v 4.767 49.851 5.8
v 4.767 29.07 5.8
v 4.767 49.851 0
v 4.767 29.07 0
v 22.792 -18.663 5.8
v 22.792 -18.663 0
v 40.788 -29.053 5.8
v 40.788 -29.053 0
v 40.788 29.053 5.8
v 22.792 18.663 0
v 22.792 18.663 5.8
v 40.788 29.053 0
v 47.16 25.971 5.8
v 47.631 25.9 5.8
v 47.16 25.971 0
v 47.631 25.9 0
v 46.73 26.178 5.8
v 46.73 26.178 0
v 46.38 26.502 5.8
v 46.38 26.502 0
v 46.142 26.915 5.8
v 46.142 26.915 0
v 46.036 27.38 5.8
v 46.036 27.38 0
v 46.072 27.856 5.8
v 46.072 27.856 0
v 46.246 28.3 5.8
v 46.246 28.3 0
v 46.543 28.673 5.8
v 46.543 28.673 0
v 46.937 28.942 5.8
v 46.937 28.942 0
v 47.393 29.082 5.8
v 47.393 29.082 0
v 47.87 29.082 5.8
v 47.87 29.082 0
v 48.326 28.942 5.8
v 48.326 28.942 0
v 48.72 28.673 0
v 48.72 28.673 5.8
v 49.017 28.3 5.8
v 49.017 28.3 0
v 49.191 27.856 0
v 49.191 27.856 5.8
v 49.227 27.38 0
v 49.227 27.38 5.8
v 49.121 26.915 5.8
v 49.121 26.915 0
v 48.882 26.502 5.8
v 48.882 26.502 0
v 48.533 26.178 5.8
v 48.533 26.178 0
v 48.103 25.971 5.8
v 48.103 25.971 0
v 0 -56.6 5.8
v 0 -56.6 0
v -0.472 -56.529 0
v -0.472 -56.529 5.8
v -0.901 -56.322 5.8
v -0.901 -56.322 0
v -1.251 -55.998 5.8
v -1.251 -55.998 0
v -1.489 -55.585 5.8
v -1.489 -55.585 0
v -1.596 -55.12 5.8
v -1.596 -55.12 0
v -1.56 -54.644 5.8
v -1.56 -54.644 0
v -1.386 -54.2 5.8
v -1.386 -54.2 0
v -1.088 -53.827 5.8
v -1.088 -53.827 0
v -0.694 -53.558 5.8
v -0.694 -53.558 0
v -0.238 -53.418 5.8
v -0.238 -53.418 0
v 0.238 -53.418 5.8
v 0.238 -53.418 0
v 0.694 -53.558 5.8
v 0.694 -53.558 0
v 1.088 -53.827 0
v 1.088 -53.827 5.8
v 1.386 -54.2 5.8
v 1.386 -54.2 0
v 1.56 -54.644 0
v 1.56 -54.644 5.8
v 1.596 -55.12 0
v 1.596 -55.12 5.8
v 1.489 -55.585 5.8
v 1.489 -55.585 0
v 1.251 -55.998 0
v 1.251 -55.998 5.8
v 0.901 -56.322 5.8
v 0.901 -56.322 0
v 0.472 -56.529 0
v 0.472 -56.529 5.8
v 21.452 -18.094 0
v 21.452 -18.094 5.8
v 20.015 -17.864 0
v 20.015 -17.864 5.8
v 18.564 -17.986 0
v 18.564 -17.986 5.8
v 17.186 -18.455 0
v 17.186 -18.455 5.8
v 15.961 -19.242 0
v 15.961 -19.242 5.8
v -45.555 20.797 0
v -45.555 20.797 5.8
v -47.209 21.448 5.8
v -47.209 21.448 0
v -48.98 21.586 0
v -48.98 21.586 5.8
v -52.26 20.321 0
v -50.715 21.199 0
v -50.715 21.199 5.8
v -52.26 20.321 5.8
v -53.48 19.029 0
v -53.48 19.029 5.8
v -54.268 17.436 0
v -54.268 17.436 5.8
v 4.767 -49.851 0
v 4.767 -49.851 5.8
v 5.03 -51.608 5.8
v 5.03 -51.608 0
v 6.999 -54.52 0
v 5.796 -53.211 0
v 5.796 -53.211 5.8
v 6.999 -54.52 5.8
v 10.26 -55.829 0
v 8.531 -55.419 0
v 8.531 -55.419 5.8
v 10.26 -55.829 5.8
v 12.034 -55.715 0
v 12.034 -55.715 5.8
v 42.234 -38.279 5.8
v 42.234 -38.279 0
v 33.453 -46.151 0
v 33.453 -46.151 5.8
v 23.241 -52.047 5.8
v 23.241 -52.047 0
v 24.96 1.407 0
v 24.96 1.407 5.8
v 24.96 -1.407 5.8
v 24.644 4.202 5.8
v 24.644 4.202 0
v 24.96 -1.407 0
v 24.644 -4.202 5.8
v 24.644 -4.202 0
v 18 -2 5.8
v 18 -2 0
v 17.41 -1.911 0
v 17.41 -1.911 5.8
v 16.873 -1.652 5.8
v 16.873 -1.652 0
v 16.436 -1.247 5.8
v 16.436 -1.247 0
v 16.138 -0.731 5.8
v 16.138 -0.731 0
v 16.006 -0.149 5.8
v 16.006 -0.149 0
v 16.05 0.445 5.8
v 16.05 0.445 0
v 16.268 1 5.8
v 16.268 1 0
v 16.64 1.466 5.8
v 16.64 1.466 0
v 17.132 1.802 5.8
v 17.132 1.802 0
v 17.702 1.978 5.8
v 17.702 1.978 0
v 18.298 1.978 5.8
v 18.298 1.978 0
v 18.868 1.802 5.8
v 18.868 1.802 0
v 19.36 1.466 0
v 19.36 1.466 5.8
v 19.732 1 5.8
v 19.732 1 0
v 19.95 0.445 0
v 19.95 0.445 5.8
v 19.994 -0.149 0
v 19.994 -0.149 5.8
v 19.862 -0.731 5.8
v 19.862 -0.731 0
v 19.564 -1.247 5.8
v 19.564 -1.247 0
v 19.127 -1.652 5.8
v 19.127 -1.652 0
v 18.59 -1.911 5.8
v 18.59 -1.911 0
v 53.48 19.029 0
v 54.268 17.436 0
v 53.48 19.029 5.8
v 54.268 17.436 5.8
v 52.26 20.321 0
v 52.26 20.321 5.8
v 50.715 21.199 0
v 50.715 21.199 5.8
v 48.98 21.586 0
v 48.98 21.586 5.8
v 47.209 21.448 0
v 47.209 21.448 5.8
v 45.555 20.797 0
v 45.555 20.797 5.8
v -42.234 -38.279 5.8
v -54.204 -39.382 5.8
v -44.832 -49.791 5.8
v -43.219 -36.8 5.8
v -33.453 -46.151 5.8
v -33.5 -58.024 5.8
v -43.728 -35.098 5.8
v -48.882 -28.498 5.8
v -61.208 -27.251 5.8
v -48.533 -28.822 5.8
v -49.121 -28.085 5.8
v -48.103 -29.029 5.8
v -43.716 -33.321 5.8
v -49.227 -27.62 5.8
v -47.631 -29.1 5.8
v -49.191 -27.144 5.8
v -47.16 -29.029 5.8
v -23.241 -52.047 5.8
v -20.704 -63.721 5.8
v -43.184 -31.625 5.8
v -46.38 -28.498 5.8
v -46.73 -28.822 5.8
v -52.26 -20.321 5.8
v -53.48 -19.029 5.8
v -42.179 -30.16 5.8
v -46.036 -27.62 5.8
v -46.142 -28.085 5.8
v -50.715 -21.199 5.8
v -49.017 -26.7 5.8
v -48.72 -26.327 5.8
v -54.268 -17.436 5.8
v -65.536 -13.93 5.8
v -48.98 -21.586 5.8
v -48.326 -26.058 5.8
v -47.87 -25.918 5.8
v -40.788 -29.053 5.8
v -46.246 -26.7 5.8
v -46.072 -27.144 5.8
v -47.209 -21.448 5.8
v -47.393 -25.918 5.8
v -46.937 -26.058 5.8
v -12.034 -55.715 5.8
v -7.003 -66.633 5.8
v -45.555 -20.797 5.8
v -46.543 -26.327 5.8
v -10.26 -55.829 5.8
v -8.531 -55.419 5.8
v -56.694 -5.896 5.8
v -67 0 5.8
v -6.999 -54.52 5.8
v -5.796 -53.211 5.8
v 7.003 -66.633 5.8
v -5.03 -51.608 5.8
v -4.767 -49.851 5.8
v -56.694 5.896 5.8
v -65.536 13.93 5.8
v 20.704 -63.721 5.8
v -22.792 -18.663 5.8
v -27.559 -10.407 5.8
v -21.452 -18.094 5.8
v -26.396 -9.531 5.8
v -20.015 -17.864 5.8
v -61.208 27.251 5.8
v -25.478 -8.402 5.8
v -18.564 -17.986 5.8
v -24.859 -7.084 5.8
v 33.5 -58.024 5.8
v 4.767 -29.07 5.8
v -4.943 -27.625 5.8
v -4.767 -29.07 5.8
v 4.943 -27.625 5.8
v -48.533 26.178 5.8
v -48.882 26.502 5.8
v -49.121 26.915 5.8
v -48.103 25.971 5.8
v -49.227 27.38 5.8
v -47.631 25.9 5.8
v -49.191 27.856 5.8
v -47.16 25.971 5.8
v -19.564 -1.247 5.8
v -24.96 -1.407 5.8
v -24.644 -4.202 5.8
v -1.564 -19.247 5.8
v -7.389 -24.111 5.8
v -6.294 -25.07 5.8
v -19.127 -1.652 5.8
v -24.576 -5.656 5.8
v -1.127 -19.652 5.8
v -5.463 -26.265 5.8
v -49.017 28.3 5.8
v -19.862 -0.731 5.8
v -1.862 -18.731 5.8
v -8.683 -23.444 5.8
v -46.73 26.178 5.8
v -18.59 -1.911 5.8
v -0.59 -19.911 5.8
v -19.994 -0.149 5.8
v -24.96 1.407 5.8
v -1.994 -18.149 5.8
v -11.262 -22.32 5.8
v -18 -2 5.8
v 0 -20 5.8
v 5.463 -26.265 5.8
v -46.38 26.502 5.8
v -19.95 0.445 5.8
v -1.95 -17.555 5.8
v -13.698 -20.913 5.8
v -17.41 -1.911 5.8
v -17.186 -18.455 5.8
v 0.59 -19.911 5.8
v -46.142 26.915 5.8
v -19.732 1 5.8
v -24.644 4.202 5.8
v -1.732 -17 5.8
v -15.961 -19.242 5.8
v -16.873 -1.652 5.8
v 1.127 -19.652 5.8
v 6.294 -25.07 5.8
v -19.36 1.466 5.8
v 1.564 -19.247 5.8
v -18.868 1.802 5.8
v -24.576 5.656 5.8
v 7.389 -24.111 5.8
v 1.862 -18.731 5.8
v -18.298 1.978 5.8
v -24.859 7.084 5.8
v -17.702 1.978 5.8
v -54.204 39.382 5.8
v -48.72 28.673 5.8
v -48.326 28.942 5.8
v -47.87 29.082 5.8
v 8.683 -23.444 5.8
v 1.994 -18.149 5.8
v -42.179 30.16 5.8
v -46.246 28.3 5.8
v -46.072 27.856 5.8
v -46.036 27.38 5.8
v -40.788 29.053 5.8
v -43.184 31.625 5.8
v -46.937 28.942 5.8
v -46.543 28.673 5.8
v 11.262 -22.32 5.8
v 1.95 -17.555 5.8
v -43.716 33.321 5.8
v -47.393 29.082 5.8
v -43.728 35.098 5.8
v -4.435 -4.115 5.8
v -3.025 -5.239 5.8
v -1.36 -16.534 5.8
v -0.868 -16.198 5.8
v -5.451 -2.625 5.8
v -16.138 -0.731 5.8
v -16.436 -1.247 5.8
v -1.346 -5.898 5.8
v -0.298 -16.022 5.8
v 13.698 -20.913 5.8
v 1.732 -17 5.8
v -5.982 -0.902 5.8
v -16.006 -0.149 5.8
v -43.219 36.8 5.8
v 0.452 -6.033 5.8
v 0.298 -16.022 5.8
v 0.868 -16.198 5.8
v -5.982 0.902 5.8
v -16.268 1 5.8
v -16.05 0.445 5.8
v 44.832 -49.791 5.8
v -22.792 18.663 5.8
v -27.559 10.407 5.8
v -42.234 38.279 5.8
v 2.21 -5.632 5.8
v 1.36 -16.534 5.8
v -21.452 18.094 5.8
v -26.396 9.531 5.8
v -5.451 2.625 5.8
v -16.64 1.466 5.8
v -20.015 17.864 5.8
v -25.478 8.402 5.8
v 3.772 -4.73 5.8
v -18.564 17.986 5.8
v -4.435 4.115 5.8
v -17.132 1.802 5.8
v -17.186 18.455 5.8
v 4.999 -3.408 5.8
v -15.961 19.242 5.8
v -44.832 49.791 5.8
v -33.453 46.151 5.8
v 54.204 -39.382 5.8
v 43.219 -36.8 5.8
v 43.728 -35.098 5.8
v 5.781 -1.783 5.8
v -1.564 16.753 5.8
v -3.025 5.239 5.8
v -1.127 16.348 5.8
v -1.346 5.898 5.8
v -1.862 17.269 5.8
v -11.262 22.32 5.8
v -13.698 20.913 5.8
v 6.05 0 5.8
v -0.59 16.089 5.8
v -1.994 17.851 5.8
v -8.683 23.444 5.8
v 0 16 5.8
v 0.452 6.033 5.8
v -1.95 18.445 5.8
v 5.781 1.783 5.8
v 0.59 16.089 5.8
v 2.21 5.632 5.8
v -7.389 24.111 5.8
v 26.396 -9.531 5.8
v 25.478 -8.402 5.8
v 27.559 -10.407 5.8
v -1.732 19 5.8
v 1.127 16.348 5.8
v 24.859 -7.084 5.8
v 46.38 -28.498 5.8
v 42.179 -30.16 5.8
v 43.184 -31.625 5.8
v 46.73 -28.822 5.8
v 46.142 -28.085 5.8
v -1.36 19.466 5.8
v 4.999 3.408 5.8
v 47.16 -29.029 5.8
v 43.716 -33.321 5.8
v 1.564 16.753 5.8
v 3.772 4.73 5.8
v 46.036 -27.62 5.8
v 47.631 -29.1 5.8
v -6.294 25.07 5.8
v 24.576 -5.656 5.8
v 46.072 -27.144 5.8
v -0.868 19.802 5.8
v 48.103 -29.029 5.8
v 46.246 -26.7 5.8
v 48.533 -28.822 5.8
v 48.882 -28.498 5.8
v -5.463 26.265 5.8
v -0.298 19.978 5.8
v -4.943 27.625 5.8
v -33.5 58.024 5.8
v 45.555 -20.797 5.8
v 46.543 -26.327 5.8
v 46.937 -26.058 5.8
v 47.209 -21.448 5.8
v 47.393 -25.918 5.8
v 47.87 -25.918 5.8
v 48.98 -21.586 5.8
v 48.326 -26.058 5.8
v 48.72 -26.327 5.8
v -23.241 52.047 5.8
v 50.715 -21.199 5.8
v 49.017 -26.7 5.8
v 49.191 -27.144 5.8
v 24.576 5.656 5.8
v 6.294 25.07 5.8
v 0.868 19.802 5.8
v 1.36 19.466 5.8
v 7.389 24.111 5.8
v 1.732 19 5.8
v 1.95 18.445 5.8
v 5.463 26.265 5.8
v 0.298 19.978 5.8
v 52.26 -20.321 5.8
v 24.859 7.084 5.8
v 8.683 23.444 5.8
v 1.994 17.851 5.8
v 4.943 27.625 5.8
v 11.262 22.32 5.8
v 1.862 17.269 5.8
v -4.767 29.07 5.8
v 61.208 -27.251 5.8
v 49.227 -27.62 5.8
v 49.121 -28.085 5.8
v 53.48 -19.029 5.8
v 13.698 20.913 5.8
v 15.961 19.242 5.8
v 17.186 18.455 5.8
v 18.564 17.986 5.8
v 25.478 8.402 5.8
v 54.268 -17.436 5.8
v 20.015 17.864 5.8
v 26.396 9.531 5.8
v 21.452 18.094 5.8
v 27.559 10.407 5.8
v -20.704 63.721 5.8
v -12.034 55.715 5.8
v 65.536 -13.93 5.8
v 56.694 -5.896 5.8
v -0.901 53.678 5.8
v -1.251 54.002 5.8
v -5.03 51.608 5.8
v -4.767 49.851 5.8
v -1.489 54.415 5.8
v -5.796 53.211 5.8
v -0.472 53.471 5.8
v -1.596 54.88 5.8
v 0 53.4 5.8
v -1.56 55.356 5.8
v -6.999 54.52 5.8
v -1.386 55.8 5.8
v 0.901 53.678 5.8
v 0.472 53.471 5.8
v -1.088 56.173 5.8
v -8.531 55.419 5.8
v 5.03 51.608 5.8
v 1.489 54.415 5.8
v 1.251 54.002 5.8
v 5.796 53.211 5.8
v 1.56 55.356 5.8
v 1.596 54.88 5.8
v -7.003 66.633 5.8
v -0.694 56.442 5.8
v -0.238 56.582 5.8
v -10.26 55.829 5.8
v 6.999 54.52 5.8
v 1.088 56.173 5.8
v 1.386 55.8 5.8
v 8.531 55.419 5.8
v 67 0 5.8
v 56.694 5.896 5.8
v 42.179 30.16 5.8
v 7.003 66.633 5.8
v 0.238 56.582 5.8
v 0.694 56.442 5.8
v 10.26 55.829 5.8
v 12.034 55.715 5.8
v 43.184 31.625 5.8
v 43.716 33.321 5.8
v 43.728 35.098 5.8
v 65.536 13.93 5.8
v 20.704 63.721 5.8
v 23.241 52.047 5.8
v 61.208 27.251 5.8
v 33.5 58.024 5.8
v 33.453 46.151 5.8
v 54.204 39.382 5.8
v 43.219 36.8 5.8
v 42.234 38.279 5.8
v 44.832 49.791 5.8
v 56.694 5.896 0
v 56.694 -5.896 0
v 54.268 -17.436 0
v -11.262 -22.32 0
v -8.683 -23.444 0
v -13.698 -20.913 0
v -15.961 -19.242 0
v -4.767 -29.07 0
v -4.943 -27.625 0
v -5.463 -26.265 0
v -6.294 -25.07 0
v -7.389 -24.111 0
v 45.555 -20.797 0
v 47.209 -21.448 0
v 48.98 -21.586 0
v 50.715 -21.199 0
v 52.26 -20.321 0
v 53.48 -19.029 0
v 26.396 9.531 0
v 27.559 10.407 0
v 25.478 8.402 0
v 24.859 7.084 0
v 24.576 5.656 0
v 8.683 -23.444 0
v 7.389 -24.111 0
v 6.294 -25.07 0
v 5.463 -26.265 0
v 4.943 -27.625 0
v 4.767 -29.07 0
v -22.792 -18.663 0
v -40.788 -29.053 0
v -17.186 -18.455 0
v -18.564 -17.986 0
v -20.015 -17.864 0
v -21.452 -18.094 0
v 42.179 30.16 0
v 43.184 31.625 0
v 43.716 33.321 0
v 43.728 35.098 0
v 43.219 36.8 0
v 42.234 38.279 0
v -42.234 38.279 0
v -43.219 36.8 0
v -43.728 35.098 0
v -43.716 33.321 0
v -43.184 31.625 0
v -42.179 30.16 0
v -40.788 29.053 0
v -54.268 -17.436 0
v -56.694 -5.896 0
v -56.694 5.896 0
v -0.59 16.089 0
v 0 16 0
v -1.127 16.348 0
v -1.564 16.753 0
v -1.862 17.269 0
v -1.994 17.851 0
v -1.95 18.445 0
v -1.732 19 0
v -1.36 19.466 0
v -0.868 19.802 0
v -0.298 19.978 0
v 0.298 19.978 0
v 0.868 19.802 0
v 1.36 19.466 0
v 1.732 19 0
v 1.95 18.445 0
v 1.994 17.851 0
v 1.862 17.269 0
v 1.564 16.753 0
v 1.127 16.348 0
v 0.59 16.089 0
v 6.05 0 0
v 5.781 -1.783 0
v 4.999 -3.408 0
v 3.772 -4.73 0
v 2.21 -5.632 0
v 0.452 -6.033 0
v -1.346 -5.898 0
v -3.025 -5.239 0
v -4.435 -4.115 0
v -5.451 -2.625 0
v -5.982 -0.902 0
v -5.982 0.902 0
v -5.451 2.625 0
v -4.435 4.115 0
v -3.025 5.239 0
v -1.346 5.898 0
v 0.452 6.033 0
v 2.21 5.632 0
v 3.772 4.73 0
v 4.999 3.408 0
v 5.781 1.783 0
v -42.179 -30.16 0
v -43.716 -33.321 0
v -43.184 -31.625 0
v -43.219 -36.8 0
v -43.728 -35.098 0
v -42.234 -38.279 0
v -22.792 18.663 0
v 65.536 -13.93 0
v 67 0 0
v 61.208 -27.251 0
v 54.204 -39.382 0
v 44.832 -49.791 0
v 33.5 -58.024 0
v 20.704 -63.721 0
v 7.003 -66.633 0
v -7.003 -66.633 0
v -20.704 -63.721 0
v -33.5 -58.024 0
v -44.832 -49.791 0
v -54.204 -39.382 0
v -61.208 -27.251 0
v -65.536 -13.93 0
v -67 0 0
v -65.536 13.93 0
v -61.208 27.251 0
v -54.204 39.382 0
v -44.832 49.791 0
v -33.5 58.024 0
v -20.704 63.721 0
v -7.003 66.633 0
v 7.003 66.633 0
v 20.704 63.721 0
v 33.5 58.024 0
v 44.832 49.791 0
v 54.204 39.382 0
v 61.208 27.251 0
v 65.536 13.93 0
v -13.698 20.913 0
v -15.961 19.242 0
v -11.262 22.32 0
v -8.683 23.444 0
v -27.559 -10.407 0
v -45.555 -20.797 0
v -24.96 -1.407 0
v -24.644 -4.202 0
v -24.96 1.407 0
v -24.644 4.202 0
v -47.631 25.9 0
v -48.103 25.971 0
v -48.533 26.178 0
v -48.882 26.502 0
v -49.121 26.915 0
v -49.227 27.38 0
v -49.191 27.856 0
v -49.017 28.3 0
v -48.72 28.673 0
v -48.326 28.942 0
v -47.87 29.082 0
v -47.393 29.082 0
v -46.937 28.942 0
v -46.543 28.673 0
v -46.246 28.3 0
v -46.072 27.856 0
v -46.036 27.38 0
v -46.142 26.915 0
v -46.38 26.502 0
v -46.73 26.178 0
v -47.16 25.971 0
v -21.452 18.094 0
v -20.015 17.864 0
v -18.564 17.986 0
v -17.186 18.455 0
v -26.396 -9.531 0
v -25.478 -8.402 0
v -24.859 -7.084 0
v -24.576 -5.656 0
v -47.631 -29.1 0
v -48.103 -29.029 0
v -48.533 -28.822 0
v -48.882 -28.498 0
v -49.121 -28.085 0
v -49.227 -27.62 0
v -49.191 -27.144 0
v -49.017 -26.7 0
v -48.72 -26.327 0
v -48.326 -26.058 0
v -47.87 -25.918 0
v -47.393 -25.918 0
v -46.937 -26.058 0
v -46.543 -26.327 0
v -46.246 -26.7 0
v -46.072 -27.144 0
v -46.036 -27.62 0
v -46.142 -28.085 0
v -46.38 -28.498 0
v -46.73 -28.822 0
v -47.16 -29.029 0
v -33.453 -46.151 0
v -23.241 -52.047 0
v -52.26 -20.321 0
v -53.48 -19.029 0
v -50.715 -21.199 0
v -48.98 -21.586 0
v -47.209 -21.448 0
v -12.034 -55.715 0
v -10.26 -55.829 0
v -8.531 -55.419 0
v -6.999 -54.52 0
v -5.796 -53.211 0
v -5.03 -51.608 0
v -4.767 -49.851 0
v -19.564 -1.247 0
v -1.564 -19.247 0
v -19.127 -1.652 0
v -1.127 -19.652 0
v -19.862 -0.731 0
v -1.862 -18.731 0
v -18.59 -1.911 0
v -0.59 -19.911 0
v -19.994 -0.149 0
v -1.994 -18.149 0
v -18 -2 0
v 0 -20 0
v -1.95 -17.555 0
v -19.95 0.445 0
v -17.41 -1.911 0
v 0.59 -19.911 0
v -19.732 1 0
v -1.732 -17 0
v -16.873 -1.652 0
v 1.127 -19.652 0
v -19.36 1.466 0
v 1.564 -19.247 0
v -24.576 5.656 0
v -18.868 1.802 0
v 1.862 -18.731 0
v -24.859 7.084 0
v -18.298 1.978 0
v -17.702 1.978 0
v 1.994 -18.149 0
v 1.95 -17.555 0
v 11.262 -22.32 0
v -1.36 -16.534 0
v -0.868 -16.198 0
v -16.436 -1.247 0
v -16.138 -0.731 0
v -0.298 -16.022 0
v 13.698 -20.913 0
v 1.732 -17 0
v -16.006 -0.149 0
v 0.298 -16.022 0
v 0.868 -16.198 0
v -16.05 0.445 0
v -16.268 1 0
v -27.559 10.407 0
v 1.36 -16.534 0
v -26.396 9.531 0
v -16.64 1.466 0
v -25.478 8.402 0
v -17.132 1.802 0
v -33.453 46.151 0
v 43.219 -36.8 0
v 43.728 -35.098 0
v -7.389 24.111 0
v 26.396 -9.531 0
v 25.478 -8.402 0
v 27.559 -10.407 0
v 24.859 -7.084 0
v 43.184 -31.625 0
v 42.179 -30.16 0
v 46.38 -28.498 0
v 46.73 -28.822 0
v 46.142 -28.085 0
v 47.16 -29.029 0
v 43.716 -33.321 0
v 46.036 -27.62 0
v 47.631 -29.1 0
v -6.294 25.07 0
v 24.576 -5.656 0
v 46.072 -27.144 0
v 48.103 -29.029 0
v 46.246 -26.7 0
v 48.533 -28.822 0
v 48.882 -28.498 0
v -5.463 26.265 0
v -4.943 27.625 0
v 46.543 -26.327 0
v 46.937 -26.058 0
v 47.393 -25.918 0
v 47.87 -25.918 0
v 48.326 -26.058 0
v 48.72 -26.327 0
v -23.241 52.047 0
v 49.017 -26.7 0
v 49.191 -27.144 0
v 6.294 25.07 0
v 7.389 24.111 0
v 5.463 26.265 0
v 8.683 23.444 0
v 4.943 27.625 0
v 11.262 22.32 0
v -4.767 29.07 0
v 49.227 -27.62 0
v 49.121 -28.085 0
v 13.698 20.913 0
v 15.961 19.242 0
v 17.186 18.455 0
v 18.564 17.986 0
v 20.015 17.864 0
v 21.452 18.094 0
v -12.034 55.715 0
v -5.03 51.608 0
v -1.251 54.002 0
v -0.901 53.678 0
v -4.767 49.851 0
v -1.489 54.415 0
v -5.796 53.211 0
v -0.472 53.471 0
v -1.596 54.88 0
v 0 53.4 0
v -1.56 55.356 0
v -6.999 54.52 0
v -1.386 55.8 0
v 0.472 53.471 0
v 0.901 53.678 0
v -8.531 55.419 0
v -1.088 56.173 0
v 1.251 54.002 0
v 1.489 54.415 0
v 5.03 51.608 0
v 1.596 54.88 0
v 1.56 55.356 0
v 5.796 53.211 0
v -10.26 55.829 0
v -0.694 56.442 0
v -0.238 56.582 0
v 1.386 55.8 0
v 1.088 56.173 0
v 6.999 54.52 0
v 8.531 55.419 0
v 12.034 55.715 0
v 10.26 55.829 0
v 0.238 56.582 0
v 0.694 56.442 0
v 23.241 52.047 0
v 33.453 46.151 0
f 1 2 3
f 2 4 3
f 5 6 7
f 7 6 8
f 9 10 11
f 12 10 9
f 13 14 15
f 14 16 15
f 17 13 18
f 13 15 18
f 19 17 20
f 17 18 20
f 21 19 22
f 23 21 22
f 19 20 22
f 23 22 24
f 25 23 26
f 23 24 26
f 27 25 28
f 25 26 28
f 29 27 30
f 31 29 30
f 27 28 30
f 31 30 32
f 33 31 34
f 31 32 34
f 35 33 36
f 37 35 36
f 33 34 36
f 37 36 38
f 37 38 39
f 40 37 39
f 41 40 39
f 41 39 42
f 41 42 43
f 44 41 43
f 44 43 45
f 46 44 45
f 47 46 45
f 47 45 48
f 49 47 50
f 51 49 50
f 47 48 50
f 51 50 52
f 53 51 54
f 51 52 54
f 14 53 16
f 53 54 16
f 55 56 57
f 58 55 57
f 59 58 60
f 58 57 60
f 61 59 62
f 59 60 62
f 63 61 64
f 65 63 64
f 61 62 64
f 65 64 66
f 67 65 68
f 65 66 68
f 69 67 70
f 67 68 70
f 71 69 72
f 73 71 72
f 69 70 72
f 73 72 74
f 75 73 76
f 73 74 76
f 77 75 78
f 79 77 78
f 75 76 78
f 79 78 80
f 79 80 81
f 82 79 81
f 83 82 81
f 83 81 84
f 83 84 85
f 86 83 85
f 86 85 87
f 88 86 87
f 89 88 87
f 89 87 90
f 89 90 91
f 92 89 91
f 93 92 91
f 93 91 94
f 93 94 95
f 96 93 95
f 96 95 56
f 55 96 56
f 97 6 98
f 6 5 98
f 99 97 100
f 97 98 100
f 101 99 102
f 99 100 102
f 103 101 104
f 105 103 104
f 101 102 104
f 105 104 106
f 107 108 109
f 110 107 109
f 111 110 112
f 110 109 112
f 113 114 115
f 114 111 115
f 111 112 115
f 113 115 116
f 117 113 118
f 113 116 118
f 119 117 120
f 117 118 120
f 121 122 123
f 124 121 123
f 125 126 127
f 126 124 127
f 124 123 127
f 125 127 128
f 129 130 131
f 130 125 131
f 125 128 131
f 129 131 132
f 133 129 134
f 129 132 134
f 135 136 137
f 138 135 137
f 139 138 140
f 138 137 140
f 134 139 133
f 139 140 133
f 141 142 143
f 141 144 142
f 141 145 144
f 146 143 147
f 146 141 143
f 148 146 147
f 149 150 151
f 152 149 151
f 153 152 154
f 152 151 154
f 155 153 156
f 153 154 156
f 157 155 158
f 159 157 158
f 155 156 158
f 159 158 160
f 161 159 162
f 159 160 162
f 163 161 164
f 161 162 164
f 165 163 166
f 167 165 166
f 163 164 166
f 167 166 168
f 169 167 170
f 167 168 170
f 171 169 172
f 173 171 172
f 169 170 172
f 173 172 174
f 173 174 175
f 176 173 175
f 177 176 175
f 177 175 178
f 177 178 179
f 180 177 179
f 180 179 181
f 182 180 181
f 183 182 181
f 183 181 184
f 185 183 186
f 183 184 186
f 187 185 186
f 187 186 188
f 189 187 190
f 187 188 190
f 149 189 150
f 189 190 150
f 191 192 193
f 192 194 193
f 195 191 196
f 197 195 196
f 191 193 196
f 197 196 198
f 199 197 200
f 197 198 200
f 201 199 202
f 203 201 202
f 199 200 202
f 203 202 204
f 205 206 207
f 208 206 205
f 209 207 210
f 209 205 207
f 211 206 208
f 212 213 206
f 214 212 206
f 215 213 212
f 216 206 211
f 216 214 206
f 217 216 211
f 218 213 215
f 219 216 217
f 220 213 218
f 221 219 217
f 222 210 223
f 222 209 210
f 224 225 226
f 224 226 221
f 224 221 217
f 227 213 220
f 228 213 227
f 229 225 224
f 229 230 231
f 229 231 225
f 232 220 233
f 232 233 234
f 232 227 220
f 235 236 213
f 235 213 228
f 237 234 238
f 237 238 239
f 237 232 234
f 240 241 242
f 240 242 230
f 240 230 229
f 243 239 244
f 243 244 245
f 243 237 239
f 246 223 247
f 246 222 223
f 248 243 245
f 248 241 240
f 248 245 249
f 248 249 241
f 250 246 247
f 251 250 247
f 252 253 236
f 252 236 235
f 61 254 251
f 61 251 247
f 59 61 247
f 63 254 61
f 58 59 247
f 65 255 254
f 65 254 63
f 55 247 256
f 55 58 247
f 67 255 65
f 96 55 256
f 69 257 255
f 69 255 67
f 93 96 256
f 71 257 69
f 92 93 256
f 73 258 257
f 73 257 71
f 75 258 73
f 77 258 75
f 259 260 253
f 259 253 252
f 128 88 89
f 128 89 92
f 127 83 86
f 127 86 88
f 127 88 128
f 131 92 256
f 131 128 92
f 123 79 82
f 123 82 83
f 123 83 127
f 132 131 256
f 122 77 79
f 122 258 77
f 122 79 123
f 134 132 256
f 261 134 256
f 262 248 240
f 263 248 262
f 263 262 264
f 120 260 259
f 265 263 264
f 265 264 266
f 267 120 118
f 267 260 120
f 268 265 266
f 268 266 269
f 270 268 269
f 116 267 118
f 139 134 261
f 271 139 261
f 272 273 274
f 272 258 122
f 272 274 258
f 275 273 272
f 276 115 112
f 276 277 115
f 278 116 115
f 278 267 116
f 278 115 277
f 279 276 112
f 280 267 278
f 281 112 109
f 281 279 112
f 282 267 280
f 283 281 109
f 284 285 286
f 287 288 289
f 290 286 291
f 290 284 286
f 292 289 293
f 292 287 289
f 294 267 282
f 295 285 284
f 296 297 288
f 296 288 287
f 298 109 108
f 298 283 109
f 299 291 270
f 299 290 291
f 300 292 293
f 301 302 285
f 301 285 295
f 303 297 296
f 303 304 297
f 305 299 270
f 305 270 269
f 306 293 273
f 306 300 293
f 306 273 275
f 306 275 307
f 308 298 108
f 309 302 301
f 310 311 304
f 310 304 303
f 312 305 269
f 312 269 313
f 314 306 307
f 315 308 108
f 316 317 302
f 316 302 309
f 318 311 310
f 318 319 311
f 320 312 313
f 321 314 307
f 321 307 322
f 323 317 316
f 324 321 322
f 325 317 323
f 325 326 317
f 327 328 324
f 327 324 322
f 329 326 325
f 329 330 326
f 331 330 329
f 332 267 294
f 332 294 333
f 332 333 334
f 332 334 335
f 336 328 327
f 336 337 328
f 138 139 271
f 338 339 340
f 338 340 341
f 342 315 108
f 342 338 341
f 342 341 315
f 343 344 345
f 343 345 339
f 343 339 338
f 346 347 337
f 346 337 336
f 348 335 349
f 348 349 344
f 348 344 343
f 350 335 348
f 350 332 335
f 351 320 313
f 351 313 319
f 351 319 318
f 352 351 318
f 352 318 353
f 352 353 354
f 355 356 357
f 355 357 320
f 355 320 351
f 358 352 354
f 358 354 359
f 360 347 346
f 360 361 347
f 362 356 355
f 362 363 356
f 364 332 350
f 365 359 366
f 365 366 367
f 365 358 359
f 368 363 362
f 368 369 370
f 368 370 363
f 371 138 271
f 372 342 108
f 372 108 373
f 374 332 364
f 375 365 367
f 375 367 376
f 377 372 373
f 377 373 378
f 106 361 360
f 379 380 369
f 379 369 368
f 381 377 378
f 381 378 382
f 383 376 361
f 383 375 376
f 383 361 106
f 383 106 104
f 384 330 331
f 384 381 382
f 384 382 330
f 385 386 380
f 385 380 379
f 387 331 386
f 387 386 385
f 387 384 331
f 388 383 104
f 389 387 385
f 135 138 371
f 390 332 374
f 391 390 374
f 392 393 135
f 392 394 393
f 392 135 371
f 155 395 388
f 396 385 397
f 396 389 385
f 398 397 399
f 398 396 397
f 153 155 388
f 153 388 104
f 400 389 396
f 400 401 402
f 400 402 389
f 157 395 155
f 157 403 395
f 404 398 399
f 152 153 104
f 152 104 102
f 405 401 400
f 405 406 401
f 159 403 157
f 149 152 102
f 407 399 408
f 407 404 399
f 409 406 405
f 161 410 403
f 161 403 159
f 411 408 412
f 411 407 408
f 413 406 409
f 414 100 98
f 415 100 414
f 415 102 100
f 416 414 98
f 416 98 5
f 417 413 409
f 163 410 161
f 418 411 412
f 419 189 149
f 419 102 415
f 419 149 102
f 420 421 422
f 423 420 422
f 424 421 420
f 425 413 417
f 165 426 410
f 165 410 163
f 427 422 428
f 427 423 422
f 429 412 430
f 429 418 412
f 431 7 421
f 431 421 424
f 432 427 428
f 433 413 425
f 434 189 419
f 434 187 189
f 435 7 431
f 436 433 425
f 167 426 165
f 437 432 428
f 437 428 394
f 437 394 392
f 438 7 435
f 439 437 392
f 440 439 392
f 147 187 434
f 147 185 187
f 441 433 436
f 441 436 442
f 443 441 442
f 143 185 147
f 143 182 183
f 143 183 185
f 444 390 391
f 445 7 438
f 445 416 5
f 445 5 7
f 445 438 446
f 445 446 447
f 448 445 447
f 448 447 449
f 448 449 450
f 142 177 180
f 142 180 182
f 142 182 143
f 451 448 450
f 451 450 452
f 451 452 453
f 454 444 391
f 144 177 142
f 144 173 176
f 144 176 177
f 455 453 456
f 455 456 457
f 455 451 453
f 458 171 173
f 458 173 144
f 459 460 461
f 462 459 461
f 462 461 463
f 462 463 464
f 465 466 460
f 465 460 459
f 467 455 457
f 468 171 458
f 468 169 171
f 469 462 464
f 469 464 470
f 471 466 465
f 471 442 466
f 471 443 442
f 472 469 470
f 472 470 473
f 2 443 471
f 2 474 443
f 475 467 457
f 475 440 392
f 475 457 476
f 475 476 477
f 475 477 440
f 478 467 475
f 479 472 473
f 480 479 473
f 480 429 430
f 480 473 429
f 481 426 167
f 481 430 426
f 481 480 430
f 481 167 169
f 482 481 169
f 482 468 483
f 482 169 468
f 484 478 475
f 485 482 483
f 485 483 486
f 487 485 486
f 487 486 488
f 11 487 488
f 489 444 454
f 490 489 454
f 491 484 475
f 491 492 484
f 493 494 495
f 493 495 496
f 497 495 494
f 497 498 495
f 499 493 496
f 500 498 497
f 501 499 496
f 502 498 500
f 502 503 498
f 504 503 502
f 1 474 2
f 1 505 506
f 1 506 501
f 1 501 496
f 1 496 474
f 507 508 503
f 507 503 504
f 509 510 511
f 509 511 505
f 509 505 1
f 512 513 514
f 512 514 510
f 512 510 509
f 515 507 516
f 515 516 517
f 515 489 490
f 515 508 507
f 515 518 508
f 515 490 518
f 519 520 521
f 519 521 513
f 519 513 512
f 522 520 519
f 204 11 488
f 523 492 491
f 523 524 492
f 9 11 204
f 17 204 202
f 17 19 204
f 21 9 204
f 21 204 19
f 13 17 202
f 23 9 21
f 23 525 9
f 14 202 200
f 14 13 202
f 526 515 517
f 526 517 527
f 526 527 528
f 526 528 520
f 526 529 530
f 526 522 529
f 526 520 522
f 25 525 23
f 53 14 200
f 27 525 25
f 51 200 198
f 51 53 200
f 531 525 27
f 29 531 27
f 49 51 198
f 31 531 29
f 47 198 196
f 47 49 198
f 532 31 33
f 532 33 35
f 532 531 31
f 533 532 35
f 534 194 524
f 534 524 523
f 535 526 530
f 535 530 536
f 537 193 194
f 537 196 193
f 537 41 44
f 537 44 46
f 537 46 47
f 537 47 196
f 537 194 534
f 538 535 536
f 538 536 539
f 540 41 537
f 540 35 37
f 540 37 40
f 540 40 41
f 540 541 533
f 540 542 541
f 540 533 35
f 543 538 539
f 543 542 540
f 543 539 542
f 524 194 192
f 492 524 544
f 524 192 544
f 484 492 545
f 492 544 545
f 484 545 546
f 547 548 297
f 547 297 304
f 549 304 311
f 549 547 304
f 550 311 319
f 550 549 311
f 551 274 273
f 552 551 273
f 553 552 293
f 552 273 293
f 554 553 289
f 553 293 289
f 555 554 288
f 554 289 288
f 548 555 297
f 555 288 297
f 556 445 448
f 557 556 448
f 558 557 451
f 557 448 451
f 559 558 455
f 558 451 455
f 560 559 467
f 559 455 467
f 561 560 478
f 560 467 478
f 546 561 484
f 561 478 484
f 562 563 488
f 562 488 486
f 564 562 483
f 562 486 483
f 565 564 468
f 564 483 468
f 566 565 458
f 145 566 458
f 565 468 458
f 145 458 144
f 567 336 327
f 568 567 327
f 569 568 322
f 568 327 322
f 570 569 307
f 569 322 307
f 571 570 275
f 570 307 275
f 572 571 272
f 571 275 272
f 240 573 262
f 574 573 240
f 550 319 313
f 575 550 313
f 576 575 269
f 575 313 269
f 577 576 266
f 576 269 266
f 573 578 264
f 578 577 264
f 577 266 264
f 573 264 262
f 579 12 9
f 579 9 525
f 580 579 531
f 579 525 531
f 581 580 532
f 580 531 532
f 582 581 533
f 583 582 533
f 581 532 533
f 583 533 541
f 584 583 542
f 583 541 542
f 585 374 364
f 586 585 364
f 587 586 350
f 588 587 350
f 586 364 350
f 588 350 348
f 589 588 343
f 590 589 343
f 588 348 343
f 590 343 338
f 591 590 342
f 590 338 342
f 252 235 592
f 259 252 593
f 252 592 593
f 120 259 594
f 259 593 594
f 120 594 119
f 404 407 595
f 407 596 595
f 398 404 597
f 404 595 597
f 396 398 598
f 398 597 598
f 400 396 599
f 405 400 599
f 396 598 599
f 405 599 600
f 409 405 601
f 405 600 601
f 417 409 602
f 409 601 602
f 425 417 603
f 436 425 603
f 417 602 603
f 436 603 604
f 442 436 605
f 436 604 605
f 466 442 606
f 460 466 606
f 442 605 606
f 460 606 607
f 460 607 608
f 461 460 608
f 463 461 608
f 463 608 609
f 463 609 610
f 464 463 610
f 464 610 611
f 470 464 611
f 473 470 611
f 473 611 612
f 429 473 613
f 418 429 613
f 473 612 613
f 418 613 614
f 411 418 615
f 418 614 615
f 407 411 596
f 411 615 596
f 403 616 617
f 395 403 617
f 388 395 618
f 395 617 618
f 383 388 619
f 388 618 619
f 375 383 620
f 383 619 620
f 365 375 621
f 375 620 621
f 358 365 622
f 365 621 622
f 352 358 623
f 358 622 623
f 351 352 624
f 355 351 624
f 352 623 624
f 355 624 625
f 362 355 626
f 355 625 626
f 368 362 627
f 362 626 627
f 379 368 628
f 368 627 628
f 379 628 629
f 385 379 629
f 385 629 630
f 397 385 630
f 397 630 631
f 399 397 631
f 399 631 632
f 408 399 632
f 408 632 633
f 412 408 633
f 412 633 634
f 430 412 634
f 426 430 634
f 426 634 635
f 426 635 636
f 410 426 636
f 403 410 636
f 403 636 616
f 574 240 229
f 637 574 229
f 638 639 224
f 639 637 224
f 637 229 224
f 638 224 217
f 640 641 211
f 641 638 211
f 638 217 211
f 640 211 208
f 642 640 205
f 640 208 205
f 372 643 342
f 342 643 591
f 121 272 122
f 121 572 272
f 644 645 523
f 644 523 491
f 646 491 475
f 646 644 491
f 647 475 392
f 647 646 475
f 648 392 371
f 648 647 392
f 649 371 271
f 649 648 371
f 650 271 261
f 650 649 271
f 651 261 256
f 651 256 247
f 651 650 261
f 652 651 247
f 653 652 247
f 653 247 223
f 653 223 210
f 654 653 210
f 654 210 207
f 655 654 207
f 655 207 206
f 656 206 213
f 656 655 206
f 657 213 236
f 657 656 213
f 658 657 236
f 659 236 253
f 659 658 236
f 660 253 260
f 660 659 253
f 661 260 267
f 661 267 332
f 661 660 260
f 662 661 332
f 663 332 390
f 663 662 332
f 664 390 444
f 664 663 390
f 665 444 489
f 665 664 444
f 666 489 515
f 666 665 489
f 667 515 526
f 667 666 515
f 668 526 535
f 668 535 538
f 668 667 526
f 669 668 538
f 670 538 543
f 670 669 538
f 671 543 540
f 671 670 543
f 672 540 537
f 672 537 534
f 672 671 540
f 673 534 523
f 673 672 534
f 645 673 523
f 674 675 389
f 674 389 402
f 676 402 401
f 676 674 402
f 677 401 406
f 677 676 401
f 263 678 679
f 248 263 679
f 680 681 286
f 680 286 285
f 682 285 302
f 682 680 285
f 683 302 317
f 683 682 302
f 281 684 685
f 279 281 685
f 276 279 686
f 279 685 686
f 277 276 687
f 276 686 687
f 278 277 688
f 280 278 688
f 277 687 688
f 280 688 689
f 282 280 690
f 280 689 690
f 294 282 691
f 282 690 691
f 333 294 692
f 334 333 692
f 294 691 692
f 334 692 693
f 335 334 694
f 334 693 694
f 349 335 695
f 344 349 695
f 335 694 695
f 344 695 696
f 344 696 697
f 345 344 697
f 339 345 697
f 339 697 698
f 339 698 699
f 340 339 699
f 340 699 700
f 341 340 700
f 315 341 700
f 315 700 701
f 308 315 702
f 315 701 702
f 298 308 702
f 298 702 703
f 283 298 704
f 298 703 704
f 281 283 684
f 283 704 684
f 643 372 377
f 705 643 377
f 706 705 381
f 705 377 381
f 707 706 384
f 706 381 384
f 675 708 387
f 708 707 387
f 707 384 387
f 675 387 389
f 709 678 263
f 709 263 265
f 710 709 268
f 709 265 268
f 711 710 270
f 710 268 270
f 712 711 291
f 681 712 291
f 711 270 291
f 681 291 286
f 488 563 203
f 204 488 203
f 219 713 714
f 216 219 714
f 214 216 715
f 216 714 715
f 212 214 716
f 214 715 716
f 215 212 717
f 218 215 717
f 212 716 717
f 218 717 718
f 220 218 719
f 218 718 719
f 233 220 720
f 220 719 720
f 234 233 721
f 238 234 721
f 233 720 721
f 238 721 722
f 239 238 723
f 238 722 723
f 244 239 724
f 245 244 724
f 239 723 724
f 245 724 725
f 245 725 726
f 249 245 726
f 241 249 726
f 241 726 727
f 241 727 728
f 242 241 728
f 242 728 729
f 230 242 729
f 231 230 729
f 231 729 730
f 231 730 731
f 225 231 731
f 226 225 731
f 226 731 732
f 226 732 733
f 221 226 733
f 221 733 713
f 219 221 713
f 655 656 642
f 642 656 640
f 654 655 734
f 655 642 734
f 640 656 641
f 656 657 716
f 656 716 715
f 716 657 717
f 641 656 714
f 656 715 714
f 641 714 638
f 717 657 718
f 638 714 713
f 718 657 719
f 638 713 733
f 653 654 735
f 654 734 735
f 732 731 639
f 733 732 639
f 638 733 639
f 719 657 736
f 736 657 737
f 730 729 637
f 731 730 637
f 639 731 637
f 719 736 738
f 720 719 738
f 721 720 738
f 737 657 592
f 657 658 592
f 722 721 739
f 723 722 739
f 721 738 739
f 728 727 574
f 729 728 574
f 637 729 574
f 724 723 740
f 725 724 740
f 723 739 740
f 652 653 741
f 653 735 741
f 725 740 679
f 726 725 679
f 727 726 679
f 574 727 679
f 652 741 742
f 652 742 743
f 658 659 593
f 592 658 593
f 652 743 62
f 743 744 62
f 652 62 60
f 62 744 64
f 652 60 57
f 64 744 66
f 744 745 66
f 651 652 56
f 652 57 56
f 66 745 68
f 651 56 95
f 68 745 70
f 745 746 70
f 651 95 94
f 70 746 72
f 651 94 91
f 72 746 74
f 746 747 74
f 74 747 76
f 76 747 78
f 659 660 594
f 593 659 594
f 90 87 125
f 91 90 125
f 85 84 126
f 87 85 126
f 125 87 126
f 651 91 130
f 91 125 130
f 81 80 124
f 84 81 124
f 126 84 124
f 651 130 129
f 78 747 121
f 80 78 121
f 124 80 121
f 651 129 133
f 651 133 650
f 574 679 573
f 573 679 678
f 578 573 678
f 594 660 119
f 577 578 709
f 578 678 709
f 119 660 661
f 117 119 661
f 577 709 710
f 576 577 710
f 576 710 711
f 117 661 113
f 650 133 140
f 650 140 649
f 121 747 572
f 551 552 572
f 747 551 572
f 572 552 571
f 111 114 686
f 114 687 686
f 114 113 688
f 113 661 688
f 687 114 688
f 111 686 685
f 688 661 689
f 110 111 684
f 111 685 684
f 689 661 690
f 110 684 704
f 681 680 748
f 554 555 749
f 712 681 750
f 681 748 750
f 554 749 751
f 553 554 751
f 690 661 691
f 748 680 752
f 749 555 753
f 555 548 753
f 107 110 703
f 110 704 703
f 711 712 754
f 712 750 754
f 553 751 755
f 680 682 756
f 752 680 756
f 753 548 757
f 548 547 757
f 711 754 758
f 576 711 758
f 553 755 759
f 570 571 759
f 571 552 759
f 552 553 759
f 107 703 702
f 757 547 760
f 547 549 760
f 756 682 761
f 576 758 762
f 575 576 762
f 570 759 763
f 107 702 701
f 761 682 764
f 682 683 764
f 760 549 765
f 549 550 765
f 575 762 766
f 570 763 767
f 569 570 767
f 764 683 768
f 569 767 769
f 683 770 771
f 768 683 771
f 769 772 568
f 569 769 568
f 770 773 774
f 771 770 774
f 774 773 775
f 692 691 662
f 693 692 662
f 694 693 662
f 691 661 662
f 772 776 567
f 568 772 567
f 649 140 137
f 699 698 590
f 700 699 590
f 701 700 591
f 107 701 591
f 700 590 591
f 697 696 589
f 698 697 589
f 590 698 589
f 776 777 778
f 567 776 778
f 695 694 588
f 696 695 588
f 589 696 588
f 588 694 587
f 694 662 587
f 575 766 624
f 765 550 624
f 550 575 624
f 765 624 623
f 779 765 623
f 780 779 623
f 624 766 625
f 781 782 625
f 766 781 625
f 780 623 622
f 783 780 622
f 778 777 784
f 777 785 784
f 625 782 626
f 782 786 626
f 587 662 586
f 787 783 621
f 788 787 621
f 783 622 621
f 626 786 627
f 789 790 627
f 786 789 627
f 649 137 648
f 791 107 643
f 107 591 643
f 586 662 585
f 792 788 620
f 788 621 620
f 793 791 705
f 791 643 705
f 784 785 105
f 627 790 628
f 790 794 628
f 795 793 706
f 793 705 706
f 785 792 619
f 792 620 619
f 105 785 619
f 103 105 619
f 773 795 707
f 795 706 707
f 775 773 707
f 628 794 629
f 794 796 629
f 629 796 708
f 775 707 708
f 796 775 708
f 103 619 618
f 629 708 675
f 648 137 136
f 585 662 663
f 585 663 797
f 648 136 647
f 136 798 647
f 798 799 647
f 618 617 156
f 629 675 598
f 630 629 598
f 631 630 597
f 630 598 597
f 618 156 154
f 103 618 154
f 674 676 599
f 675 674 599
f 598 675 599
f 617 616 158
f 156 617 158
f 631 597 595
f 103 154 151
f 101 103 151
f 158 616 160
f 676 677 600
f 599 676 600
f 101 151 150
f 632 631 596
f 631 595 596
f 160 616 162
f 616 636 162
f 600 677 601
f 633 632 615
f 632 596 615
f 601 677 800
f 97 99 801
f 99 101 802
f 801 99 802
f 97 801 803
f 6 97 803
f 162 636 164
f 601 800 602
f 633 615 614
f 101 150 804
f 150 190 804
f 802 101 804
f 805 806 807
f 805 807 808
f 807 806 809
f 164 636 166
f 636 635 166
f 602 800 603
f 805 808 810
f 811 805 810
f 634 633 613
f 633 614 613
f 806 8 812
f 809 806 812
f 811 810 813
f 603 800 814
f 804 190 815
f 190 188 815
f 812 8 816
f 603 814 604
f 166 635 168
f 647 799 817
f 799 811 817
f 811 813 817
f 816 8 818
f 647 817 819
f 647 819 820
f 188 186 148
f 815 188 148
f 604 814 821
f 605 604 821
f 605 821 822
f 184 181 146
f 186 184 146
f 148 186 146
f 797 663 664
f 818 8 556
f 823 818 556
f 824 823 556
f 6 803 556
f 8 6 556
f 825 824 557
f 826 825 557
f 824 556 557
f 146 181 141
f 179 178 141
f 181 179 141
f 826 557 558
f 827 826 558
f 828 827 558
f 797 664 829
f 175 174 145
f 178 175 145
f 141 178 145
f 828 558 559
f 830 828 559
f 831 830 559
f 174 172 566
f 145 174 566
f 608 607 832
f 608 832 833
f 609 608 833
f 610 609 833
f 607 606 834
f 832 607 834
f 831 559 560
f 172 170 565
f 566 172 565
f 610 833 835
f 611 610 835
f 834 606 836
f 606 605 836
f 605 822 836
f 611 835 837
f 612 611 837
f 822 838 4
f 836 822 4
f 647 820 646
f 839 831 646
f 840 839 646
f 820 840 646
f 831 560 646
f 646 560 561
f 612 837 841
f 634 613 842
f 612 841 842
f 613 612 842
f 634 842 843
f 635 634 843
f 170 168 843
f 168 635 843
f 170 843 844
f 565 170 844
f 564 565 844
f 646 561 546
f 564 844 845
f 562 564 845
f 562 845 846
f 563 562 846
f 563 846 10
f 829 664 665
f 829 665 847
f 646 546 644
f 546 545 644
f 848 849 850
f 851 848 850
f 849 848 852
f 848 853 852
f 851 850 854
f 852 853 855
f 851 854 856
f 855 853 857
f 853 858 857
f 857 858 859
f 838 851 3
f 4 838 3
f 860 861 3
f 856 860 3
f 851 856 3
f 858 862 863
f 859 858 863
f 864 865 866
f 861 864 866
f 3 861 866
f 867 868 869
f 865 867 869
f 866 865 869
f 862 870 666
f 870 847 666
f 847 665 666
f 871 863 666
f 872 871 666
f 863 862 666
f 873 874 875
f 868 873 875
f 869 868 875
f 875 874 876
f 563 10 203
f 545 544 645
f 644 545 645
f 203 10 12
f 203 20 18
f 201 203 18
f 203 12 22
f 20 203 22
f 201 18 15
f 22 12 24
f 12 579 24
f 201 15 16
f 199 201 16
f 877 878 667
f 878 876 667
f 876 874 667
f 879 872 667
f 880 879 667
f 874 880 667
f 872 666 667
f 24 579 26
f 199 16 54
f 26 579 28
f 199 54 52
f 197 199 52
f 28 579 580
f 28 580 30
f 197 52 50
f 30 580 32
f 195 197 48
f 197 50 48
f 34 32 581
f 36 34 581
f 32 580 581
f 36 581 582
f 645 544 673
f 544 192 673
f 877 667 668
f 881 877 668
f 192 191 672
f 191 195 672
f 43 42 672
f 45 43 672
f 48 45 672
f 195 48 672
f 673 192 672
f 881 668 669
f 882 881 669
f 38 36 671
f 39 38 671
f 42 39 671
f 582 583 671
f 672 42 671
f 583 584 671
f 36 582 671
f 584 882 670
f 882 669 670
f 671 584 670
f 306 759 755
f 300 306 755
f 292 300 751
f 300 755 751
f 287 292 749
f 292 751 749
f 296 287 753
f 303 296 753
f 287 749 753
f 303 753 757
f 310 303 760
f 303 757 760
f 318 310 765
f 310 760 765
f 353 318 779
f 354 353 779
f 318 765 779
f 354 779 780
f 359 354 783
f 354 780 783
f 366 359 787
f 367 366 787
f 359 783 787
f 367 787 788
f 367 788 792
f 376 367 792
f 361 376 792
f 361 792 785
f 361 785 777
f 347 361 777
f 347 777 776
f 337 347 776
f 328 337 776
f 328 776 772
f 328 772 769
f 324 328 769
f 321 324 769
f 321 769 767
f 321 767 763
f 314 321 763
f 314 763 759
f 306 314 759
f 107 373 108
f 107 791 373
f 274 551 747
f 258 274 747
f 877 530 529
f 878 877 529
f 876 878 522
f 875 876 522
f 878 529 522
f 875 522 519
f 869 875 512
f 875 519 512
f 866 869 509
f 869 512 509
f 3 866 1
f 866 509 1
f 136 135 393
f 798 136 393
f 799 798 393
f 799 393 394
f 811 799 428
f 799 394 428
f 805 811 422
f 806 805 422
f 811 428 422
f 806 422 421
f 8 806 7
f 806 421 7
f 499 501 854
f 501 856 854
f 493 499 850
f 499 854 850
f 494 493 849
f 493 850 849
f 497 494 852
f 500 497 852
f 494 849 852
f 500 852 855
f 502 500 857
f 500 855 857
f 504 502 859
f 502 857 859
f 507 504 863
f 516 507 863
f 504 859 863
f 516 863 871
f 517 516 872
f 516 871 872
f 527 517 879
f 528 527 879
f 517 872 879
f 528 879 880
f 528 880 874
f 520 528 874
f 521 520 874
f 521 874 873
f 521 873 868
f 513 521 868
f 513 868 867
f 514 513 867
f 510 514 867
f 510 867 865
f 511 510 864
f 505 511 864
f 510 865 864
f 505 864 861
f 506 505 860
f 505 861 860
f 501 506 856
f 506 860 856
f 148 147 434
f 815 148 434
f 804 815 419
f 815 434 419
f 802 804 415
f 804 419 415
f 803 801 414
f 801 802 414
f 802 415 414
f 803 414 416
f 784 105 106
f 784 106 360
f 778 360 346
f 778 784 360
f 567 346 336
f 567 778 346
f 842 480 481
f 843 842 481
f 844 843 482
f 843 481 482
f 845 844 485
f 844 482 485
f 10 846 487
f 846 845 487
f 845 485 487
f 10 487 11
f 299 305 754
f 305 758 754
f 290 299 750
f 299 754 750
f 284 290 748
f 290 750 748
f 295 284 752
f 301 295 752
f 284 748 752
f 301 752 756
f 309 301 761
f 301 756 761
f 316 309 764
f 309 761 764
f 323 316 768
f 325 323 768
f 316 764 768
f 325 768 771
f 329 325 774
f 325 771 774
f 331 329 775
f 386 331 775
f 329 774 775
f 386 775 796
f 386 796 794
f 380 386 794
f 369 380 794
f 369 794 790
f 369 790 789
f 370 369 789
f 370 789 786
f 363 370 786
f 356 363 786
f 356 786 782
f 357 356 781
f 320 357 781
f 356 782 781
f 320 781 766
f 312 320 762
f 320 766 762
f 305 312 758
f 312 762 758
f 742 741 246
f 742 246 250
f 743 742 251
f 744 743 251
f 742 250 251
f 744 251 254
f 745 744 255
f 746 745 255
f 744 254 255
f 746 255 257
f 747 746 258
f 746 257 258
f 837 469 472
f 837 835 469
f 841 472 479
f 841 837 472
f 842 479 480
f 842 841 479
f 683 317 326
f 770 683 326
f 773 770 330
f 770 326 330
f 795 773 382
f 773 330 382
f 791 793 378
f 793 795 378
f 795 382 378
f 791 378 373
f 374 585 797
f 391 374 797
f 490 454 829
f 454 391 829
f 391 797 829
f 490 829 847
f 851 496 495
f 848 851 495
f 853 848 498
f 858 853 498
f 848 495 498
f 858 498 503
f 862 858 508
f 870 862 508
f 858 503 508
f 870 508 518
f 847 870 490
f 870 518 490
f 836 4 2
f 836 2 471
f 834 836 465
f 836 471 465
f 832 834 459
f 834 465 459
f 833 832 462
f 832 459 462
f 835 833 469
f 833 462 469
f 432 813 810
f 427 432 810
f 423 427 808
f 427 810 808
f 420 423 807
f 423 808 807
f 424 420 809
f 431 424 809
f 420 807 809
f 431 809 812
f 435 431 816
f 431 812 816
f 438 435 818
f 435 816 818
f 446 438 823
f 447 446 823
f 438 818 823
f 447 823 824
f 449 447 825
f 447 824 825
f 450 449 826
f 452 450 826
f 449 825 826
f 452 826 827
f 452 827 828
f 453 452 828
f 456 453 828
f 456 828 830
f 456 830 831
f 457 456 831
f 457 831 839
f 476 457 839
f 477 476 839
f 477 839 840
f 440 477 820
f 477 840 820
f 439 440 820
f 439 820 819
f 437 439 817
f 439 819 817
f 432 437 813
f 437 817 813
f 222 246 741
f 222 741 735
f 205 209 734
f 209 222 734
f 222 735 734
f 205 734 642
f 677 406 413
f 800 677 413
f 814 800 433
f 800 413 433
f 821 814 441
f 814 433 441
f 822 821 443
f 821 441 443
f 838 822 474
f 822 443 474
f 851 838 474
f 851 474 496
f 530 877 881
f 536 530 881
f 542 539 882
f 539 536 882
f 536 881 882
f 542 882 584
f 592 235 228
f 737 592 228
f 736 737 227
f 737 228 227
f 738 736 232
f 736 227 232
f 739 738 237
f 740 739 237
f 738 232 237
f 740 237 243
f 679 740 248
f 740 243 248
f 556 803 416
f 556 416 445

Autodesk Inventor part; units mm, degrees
ref_plane "YZ Plane" through (0, 0, 0) normal (1, 0, 0) x (0, 1, 0)
ref_plane "XZ Plane" through (0, 0, 0) normal (0, 1, 0) x (-1, 0, 0)
ref_plane "XY Plane" through (0, 0, 0) normal (0, 0, 1) x (1, 0, 0)
sketch "スケッチ1" plane through (0, 0, 0) normal (0, 0, 1) x (1, 0, 0)
  circle A0 centre (0, 0) radius 67
  circle A1 centre (0, 0) radius 57
  circle A2 centre (0, 0) radius 25
  line L0 (0, 0) -> (0, 67)
  circle A3 centre (0, 0) radius 6.05
  line L1 (4.7669, 0.7625) -> (4.7669, 66.8302)
  line L2 (4.7669, 0.7625) -> (70.8346, 0.7625) construction
  line L3 (-4.7669, 0.7625) -> (-4.7669, 66.8302)
  line L4 (-3.0438, -3.747) -> (-60.2601, 29.2869)
  line L5 (1.7231, 4.5095) -> (-55.4932, 37.5433)
  line L6 (1.7231, -4.5095) -> (-55.4932, -37.5433)
  line L7 (-3.0438, 3.747) -> (-60.2601, -29.2869)
  line L8 (4.7669, -0.7625) -> (4.7669, -66.8302)
  line L9 (-4.7669, -0.7625) -> (-4.7669, -66.8302)
  line L10 (3.0438, 3.747) -> (60.2601, -29.2869)
  line L11 (-1.7231, -4.5095) -> (55.4932, -37.5433)
  line L12 (-1.7231, 4.5095) -> (55.4932, 37.5433)
  line L13 (3.0438, -3.747) -> (60.2601, 29.2869)
  point P0 (4.7669, 56.8003)
  point P1 (46.8071, 32.5284)
  point P2 (18.87, 16.3989)
  point P3 (4.7669, 24.5413)
  point P4 (-4.7669, 56.8003)
  point P5 (-4.7669, 24.5413)
  point P6 (-18.87, 16.3989)
  point P7 (-46.8071, 32.5284)
  point P8 (51.574, -24.2719)
  point P9 (23.6368, -8.1424)
  point P10 (23.6368, 8.1424)
  point P11 (51.574, 24.2719)
  point P12 (4.7669, -56.8003)
  point P13 (4.7669, -24.5413)
  point P14 (18.87, -16.3989)
  point P15 (46.8071, -32.5284)
  point P16 (-46.8071, -32.5284)
  point P17 (-18.87, -16.3989)
  point P18 (-4.7669, -24.5413)
  point P19 (-4.7669, -56.8003)
  point P20 (-51.574, 24.2719)
  point P21 (-23.6368, 8.1424)
  point P22 (-23.6368, -8.1424)
  point P23 (-51.574, -24.2719)
  dimension "d0" = 134
  dimension "d1" = 114
  dimension "d2" = 50
  dimension "d3" = 12.1
  dimension "d4" = 90
  dimension "d7" = 360
extrude "押し出し1" add sketch "スケッチ1" along normal blind 5.8 contours A0 L10 A1 L13 | L13 A1 L12 A0 | A0 L11 A1 L10 | L12 A1 L1 A0 | L13 A2 L12 A1 | A0 L8 A1 L11 | A1 L11 A2 L10 | L1 A1 L0 A0 | L13 L10 A3 L1 L12 A2 | A2 L10 L13 | A0 L9 A1 L8 | A2 L11 L8 A3 L13 L10 | L0 A1 L3 A0 | L1 A2 L0 A1 | L12 L1 A2 | L13 A3 L10 | A0 L6 A1 L9 | A1 L9 A2 L8 | A2 L8 L11 | L3 A1 L5 A0 | L0 A2 L3 A1 | L1 L12 A3 L0 A2 | L1 A3 L12 | A0 L7 A1 L6 | A2 L9 L6 A3 L11 L8 | L11 A3 L8 | L5 A1 L4 A0 | L0 A3 L5 L3 A2 | A0 L4 A1 L7 | A1 L7 A2 L6 | A2 L6 L9 | L5 A2 L4 A1 | L3 L5 A2 | A2 L7 L4 A3 L9 L6 | L9 A3 L6 | L5 L3 A3 L7 L4 A2 | L5 A3 L3 | A2 L4 L7 | L7 A3 L4
sketch "スケッチ2" plane through (0, 0, 5.8) normal (0, 0, 1) x (1, 0, 0)
  point P0 (0, 0)
  point P1 (0, 18)
  point P2 (-18, 0)
  point P3 (0, -18)
  point P4 (18, 0)
  point P5 (0, 55)
  point P6 (-47.6314, 27.5)
  point P7 (-47.6314, -27.5)
  point P8 (0, -55)
  point P9 (47.6314, -27.5)
  point P10 (47.6314, 27.5)
  dimension "d11" = 18
  dimension "d14" = 360
  dimension "d16" = 55
  dimension "d19" = 360
hole "穴1" at (0, 18, 5.8) at (-18, 0, 5.8) at (0, -18, 5.8) at (18, 0, 5.8) direction (0, 0, -1) diameter 4 end through all
hole "穴2" at (0, 55, 5.8) at (-47.6314, 27.5, 5.8) at (-47.6314, -27.5, 5.8) at (0, -55, 5.8) at (47.6314, -27.5, 5.8) at (47.6314, 27.5, 5.8) direction (0, 0, -1) diameter 3.2 end through all
fillet "フィレット1" radius 6 24 edges at (-51.574, 24.2719, 2.9) (-51.574, -24.2719, 2.9) (-23.6368, -8.1424, 2.9) (-23.6368, 8.1424, 2.9) (-46.8071, 32.5284, 2.9) (-18.87, 16.3989, 2.9) (-4.7669, 24.5413, 2.9) (-4.7669, 56.8003, 2.9) (4.7669, 56.8003, 2.9) (4.7669, 24.5413, 2.9) (18.87, 16.3989, 2.9) (46.8071, 32.5284, 2.9) (51.574, 24.2719, 2.9) (23.6368, 8.1424, 2.9) (23.6368, -8.1424, 2.9) (51.574, -24.2719, 2.9) (46.8071, -32.5284, 2.9) (18.87, -16.3989, 2.9) (4.7669, -24.5413, 2.9) (4.7669, -56.8003, 2.9) (-4.7669, -56.8003, 2.9) (-4.7669, -24.5413, 2.9) (-18.87, -16.3989, 2.9) (-46.8071, -32.5284, 2.9)
properties part number "TH22_POM_roller_sn" material "ABS プラスチック"
